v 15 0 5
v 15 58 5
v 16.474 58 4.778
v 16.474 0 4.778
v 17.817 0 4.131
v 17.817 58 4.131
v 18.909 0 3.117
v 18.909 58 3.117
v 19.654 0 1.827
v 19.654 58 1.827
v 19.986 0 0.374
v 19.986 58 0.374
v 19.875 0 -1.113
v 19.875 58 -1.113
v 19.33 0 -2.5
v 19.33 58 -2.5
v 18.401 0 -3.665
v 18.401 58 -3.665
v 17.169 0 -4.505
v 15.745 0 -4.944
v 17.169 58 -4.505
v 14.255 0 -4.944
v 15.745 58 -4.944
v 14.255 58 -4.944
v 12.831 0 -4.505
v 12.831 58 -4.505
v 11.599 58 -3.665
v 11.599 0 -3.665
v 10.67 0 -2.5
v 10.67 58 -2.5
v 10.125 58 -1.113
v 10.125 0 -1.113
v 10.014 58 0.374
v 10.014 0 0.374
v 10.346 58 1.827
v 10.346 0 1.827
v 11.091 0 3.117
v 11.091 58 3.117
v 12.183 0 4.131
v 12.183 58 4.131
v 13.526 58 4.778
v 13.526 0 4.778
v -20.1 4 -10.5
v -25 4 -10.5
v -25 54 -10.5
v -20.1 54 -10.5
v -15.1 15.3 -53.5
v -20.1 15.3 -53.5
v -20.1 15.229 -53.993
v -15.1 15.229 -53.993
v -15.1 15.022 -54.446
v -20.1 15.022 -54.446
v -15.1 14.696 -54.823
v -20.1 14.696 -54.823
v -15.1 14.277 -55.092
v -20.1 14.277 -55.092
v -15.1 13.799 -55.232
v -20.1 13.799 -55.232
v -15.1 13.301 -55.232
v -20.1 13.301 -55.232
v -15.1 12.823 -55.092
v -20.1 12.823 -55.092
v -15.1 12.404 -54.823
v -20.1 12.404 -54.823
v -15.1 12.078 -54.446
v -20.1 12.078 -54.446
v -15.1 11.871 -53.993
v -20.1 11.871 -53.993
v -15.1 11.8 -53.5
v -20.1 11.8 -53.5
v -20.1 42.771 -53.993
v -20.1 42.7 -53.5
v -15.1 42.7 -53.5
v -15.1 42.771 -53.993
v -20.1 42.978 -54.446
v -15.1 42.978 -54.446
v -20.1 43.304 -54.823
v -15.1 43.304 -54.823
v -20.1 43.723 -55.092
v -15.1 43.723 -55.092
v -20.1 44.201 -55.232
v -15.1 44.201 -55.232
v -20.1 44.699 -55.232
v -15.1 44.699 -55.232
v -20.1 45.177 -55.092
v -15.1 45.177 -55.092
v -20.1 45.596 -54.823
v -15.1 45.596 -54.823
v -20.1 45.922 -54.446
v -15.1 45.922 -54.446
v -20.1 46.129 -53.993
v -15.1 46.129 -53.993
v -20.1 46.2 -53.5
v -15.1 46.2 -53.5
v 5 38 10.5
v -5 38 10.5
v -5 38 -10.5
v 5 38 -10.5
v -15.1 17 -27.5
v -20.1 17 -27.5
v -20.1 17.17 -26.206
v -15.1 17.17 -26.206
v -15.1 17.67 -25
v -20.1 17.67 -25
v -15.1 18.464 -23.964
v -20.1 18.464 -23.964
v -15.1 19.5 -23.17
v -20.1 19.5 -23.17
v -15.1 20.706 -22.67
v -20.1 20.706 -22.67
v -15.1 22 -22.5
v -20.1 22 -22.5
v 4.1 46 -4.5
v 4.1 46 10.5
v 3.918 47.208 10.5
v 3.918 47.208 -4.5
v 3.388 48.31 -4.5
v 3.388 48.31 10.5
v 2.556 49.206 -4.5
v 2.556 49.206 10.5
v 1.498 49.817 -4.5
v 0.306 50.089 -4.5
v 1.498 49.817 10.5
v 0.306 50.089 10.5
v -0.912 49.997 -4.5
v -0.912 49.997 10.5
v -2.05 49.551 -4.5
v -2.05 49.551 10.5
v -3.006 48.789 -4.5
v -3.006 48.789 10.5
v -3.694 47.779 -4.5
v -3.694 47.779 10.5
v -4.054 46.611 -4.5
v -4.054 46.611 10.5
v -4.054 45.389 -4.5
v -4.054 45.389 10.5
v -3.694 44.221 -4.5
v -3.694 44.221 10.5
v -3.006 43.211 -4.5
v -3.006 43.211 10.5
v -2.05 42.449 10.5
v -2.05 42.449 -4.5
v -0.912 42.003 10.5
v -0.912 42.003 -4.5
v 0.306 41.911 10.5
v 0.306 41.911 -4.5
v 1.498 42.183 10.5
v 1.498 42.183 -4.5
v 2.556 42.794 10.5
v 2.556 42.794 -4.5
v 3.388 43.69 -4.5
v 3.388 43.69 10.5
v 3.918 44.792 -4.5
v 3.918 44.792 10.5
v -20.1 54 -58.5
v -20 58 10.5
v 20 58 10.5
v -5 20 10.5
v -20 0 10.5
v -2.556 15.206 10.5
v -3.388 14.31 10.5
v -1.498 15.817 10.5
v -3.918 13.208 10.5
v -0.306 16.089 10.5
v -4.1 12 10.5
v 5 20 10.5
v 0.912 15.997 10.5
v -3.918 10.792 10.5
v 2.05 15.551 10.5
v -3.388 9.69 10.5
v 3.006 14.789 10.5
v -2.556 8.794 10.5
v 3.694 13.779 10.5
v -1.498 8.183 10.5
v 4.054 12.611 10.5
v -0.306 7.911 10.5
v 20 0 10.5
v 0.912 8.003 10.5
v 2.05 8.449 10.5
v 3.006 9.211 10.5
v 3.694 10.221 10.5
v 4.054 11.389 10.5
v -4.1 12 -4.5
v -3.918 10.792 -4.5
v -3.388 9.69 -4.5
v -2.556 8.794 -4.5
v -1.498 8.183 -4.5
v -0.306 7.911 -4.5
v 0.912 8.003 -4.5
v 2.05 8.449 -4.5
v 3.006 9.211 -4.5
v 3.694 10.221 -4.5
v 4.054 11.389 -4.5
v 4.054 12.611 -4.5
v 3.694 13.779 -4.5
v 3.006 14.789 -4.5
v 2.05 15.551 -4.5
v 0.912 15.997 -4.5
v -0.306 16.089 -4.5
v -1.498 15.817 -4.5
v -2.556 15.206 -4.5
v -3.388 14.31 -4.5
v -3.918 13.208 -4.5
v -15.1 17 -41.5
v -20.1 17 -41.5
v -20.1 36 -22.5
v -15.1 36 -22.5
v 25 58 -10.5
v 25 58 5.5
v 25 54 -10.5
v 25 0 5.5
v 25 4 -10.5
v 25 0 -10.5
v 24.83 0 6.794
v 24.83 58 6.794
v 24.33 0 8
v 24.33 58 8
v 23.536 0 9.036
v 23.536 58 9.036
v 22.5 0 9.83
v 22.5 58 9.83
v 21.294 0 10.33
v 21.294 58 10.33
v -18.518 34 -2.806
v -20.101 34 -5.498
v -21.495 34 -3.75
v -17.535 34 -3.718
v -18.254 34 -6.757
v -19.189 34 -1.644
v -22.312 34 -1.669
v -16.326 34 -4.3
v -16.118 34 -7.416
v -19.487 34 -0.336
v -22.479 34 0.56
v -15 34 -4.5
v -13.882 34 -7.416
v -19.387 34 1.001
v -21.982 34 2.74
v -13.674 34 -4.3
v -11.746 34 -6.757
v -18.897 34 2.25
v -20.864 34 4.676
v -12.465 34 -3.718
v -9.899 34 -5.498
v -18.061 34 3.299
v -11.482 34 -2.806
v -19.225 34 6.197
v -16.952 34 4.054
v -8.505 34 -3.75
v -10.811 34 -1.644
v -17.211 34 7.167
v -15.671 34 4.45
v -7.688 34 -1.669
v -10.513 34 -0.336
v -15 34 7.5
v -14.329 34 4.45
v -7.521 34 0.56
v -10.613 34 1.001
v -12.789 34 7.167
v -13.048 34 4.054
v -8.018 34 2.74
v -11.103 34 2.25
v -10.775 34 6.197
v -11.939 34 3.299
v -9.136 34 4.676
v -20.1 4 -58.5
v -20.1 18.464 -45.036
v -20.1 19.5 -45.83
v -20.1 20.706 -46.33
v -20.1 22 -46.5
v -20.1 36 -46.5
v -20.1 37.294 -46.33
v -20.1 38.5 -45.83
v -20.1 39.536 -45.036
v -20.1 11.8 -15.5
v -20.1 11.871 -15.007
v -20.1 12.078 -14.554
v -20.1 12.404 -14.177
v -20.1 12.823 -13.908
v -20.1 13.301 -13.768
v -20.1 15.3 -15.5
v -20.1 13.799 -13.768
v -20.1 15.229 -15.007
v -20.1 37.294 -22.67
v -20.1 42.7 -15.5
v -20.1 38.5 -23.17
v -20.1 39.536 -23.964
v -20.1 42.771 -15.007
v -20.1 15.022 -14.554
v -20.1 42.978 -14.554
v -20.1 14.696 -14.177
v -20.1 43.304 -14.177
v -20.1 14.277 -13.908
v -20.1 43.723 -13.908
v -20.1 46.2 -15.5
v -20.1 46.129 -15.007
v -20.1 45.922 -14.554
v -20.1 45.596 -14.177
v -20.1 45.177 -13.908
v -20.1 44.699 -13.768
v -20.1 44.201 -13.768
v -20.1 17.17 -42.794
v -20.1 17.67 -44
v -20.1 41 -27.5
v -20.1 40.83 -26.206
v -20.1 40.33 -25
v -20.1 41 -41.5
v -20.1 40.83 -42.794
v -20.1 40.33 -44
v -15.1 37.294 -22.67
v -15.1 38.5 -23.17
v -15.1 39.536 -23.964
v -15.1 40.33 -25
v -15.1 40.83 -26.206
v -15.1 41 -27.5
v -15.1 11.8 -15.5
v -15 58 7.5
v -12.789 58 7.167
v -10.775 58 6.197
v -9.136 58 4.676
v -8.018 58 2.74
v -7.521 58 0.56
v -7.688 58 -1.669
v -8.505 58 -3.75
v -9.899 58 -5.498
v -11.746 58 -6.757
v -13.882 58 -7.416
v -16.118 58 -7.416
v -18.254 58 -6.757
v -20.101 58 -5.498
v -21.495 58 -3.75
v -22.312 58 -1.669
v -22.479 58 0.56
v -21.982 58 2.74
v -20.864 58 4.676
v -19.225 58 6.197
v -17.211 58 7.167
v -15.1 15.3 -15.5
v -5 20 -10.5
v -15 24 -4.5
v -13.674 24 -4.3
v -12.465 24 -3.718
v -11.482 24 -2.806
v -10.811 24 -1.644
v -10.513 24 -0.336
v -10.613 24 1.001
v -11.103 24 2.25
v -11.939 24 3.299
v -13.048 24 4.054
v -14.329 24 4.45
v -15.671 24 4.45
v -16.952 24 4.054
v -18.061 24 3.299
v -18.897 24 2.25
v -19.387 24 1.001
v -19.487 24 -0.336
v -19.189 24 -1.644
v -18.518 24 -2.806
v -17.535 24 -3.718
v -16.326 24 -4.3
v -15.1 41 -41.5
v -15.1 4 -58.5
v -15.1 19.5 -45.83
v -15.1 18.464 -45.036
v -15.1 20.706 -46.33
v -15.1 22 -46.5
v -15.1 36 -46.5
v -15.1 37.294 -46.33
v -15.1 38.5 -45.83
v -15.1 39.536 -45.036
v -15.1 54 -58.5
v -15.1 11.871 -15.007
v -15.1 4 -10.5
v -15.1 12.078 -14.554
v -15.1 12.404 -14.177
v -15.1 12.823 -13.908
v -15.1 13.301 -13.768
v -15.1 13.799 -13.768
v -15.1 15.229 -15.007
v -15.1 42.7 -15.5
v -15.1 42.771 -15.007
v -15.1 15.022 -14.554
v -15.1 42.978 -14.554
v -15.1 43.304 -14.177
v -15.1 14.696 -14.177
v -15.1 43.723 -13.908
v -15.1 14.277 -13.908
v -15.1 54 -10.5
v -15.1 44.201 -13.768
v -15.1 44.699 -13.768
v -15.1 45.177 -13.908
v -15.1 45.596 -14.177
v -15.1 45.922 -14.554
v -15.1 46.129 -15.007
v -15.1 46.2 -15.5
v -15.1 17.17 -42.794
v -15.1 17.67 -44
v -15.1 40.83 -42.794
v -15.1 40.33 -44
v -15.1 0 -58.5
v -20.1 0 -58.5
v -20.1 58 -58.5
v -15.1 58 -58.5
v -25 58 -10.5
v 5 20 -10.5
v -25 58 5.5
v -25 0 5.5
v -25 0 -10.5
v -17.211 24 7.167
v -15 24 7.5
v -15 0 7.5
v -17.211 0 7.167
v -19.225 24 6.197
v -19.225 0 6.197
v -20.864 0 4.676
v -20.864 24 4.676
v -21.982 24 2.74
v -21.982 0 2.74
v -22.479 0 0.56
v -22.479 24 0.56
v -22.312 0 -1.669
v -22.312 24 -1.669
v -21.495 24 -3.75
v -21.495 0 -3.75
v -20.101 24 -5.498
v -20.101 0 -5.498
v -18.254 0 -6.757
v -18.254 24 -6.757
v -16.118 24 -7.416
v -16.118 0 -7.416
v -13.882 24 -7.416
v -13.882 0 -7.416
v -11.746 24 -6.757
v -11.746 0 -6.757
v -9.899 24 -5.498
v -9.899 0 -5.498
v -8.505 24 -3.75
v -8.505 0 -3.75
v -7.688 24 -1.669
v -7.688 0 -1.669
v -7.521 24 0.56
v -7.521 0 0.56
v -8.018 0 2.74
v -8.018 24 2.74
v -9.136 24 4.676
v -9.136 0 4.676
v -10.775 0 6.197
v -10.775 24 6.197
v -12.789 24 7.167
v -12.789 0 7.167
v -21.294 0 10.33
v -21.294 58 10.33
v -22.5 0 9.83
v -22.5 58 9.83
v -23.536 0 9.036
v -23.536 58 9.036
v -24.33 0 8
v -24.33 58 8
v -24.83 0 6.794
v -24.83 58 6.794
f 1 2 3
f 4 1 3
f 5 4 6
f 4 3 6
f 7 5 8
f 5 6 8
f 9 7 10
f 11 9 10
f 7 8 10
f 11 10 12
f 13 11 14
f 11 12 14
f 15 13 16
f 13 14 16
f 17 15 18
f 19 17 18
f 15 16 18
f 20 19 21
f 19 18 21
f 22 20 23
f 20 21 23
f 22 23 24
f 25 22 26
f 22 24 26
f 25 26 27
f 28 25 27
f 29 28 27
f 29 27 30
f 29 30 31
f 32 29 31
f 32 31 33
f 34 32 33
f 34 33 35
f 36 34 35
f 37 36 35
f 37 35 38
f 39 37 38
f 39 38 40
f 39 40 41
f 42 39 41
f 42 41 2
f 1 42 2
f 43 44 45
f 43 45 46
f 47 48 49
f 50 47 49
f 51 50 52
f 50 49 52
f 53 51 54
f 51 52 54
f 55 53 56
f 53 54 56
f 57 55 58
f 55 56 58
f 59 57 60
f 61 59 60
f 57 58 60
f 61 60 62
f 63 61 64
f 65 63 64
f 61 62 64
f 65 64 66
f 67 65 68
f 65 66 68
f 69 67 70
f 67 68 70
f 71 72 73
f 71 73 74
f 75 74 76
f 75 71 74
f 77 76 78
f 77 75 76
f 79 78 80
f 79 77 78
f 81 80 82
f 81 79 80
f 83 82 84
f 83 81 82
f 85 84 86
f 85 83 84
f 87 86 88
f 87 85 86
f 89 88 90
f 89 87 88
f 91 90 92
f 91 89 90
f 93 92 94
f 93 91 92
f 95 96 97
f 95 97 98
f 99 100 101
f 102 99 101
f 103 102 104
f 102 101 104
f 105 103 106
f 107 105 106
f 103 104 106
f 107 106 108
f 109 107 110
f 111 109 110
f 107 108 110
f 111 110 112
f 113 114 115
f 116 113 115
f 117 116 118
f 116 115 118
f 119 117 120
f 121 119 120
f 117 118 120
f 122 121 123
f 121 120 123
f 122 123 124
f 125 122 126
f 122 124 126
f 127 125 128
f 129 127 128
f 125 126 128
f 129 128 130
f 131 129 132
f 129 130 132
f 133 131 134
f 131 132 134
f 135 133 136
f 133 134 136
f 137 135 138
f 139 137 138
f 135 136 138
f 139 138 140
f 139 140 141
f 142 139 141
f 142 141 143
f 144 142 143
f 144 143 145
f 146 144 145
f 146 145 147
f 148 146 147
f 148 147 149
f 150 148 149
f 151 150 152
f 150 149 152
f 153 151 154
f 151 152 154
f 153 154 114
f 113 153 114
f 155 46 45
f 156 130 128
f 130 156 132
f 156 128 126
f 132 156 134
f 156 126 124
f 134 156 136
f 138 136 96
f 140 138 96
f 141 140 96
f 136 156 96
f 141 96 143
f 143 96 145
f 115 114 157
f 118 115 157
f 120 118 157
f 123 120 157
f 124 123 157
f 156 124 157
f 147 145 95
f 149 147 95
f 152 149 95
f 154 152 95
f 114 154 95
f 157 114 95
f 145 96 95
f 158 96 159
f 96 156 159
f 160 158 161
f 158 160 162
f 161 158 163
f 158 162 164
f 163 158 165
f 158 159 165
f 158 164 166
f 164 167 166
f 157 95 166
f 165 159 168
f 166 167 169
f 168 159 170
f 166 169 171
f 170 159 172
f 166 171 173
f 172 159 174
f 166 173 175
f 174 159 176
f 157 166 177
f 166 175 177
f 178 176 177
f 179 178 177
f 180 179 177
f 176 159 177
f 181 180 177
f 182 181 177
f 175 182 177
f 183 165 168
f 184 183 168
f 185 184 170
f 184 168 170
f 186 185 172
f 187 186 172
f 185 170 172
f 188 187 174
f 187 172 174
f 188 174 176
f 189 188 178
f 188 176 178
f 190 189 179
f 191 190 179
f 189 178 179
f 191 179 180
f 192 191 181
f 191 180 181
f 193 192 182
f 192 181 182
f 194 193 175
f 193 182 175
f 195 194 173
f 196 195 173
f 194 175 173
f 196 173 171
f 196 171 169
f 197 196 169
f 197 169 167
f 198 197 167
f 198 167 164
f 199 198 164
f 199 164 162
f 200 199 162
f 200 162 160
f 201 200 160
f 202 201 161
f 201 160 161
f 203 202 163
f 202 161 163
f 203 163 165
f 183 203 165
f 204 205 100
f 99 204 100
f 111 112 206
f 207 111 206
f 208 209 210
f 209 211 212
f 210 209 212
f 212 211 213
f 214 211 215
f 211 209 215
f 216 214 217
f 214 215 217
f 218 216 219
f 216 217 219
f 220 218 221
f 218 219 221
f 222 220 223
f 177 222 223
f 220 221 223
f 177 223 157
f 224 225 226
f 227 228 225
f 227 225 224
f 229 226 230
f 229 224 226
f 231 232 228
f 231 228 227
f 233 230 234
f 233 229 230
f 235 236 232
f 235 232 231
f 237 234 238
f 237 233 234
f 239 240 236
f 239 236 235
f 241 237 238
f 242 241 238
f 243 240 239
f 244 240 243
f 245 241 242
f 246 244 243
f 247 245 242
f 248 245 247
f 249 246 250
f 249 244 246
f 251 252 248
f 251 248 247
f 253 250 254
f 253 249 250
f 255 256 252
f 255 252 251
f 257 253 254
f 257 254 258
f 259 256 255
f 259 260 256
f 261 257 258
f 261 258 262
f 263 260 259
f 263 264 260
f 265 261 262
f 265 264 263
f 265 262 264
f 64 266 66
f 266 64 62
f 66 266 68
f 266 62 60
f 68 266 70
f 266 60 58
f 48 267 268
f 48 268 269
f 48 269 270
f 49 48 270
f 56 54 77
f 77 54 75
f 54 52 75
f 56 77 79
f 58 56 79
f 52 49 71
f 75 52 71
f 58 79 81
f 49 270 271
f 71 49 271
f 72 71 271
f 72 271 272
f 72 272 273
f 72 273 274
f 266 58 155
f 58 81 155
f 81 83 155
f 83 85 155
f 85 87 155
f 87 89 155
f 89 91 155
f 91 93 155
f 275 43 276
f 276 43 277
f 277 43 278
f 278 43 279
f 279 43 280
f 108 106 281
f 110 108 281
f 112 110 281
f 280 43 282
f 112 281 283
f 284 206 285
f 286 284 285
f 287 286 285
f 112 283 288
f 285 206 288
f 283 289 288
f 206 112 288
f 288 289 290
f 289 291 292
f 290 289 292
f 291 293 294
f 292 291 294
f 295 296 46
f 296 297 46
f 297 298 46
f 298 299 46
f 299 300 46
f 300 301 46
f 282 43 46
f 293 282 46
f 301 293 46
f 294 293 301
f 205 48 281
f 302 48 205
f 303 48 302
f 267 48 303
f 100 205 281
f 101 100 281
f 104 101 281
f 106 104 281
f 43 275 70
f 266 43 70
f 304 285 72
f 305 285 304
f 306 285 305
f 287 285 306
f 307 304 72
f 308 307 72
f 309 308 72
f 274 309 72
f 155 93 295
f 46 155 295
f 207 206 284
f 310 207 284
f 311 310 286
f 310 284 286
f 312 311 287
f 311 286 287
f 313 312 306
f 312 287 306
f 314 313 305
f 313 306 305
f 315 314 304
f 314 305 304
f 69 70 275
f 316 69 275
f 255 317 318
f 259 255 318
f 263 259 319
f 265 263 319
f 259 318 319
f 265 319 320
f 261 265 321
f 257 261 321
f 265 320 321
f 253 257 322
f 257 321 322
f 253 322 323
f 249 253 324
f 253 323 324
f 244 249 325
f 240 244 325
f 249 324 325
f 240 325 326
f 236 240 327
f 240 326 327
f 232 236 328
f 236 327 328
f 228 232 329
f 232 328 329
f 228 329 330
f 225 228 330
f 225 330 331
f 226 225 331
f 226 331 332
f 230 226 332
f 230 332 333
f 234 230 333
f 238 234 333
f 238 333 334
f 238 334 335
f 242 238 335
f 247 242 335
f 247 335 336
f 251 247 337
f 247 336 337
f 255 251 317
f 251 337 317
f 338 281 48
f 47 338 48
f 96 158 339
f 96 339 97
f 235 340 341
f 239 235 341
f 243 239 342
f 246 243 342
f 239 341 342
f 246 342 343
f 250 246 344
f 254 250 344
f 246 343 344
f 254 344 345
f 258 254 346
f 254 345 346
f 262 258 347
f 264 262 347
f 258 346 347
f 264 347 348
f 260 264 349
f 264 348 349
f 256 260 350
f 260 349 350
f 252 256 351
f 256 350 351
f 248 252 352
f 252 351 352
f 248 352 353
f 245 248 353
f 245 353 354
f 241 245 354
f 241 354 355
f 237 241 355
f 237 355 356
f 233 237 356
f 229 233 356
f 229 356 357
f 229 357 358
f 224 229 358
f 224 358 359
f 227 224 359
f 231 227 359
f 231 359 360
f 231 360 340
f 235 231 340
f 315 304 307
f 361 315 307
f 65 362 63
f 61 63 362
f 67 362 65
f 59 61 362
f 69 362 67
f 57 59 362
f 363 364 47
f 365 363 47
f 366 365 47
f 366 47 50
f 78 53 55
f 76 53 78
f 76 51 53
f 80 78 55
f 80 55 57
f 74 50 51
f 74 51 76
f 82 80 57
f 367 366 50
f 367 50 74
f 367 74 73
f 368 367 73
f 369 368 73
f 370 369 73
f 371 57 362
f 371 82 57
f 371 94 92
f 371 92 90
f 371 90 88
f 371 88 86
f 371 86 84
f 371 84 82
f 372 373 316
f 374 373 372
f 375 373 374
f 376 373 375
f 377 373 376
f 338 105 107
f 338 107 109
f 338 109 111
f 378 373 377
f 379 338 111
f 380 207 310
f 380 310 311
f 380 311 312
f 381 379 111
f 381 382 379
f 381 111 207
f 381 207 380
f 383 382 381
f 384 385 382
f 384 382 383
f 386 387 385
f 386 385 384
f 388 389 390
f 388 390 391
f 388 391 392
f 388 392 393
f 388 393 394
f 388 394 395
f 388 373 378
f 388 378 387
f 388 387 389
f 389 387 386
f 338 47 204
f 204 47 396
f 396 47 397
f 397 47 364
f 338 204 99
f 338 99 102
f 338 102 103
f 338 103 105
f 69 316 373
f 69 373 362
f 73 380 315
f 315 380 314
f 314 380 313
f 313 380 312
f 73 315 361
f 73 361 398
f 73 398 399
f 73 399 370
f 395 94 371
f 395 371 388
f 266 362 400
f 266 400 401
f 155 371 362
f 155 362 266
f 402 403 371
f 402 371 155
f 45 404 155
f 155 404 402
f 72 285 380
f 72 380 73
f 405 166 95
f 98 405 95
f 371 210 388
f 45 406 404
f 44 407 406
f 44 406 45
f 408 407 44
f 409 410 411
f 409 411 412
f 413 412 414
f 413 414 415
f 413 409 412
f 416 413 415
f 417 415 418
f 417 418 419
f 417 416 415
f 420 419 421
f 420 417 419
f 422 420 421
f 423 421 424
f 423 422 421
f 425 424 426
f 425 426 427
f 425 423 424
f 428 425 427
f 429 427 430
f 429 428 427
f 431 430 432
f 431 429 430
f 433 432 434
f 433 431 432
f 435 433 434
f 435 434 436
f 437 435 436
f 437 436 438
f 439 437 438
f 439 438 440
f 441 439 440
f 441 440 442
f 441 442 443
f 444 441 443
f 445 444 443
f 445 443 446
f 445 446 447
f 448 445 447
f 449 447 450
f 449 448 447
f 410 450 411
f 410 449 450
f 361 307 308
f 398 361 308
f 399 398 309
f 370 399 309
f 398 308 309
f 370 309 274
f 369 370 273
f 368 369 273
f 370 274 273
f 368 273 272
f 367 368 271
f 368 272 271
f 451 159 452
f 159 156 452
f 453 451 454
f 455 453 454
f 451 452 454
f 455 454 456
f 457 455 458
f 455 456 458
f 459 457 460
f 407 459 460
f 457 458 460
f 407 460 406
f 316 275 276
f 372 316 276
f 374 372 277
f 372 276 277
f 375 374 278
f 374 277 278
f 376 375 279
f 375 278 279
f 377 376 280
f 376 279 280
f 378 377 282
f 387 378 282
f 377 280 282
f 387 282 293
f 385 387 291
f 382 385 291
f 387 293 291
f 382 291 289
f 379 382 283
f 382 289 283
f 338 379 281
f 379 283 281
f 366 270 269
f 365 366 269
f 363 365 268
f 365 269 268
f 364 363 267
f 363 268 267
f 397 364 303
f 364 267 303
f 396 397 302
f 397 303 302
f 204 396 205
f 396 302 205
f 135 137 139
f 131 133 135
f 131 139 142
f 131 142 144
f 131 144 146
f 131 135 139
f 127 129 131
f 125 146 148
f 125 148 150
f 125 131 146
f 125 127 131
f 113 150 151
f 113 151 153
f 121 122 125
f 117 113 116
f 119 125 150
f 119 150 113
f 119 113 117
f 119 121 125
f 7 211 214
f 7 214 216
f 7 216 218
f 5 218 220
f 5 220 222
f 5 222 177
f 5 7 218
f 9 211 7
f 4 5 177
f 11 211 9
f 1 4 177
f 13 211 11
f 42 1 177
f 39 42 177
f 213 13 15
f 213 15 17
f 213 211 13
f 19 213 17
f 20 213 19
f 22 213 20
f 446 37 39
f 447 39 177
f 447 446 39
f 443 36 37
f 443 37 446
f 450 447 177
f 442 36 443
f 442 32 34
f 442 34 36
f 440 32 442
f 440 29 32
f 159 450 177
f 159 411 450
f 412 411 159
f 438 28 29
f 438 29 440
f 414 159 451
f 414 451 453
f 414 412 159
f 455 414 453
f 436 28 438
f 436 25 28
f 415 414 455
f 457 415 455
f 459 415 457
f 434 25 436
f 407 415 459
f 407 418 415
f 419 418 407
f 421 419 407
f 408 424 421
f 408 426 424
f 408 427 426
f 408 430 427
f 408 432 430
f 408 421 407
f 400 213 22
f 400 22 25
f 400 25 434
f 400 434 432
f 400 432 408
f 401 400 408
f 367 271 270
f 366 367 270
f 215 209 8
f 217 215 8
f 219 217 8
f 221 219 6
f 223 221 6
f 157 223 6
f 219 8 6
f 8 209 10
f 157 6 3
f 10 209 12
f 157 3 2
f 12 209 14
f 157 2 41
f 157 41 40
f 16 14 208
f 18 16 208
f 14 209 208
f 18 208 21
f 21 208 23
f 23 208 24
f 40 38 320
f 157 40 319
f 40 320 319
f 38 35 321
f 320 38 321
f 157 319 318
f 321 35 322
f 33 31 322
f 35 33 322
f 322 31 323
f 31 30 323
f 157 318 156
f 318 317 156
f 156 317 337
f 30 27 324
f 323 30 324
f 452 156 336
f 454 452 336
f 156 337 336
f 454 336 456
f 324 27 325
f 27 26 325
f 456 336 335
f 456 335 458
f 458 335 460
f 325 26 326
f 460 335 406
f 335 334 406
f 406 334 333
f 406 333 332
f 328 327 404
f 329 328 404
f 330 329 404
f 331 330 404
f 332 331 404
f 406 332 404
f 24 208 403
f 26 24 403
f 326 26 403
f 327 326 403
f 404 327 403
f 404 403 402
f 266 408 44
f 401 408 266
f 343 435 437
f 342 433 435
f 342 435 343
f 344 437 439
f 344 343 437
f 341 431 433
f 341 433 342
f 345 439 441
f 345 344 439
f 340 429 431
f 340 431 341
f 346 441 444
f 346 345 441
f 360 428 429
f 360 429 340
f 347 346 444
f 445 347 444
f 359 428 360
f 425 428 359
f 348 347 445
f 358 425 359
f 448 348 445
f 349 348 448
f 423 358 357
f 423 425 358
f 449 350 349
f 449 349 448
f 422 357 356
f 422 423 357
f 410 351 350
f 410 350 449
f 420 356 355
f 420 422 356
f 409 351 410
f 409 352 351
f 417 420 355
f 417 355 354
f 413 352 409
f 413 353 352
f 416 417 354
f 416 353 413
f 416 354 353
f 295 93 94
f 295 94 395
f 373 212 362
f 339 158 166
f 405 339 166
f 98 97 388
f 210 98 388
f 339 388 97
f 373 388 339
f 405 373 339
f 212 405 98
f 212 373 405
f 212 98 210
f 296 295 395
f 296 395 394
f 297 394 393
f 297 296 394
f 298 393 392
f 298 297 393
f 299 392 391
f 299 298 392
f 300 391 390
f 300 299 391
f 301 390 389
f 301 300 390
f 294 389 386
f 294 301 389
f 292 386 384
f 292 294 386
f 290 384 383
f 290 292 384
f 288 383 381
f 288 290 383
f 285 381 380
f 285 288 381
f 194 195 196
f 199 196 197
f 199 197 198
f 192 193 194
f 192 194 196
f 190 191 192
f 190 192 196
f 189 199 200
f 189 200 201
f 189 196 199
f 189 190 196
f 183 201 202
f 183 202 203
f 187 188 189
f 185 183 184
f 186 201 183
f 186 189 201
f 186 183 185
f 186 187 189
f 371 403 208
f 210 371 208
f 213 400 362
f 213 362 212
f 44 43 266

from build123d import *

# Parameters (mm, degrees)
SKETCH1_W           = 50
SKETCH1_H           = 21
BOSS_EXTRUDE1_DEPTH = 58
SKETCH3_R           = 7.5
CUT_EXTRUDE1_DEPTH  = 24
CUT_EXTRUDE2_REACH  = 66.025
SKETCH4_R           = 5
CUT_EXTRUDE3_START  = -24
SKETCH5_R           = 7.5
CUT_EXTRUDE3_DEPTH  = 24
CUT_EXTRUDE4_REACH  = 66.025
SKETCH6_R           = 4.5
CUT_EXTRUDE5_REACH  = 68.558
SKETCH8_W           = 10
SKETCH8_H           = 18
SKETCH9_W           = 5
SKETCH9_H           = 58
BOSS_EXTRUDE3_DEPTH = 48
CUT_EXTRUDE7_REACH  = 95.916
BOSS_EXTRUDE4_DEPTH = 4
FILLET1_R           = 5
SKETCH7_R           = 4.1
CUT_EXTRUDE8_DEPTH  = 15


with BuildPart() as part:
    # Sketch1 → Boss-Extrude1 (new body)
    with BuildSketch(Plane(origin=(0, 0, 0), x_dir=(1, 0, 0), z_dir=(0, 1, 0))):
        Rectangle(SKETCH1_W, SKETCH1_H)
    extrude(amount=BOSS_EXTRUDE1_DEPTH)

    # Sketch3 → Cut-Extrude1 (cut)
    with BuildSketch(Plane(origin=(0, 58, 0), x_dir=(1, 0, 0), z_dir=(0, 1, 0))):
        with Locations(Location((-15, 0, 0), (0, 0, 270))):
            Circle(SKETCH3_R)
    extrude(amount=-CUT_EXTRUDE1_DEPTH, mode=Mode.SUBTRACT)

    # Sketch4 → Cut-Extrude2 (cut, up to next)
    with BuildSketch(Plane(origin=(0, 58, 0), x_dir=(1, 0, 0), z_dir=(0, 1, 0)), mode=Mode.PRIVATE) as cut_extrude2_sk1:
        with Locations(Location((15, 0, 0), (0, 0, 270))):
            Circle(SKETCH4_R)
    cut_extrude2_tool1 = extrude(cut_extrude2_sk1.sketch, amount=-CUT_EXTRUDE2_REACH, mode=Mode.PRIVATE) & part.part
    add(cut_extrude2_tool1.solids().sort_by_distance((15, 58, 0))[0], mode=Mode.SUBTRACT)

    # Sketch5 → Cut-Extrude3 (cut)
    with BuildSketch(Plane.XZ.offset(CUT_EXTRUDE3_START)):
        with Locations(Location((-15, 0, 0), (0, 0, 90))):
            Circle(SKETCH5_R)
    extrude(amount=CUT_EXTRUDE3_DEPTH, mode=Mode.SUBTRACT)

    # Sketch6 → Cut-Extrude4 (cut, up to next)
    with BuildSketch(Plane.XZ, mode=Mode.PRIVATE) as cut_extrude4_sk1:
        with Locations(Location((-15, 0, 0), (0, 0, 270))):
            Circle(SKETCH6_R)
    cut_extrude4_tool1 = extrude(cut_extrude4_sk1.sketch, amount=-CUT_EXTRUDE4_REACH, mode=Mode.PRIVATE) & part.part
    add(cut_extrude4_tool1.solids().sort_by_distance((-15, 0, 0))[0], mode=Mode.SUBTRACT)

    # Sketch8 → Cut-Extrude5 (cut, up to next)
    with BuildSketch(Plane.XY.offset(10.5), mode=Mode.PRIVATE) as cut_extrude5_sk1:
        with Locations((0, 29)):
            Rectangle(SKETCH8_W, SKETCH8_H)
    cut_extrude5_tool1 = extrude(cut_extrude5_sk1.sketch, amount=-CUT_EXTRUDE5_REACH, mode=Mode.PRIVATE) & part.part
    add(cut_extrude5_tool1.solids().sort_by_distance((0, 29, 10.5))[0], mode=Mode.SUBTRACT)

    # Sketch9 → Boss-Extrude3 (add)
    with BuildSketch(Plane(origin=(0, 0, -10.5), x_dir=(-1, 0, 0), z_dir=(0, 0, -1))):
        with Locations((17.6, 29)):
            Rectangle(SKETCH9_W, SKETCH9_H)
    extrude(amount=BOSS_EXTRUDE3_DEPTH)

    # Sketch10 → Cut-Extrude7 (cut, up to next)
    with BuildSketch(Plane.ZY.offset(20.1), mode=Mode.PRIVATE) as cut_extrude7_sk1:
        with BuildLine():
            Line((-41.5, 17), (-27.5, 17))
            ThreePointArc((-27.5, 17), (-23.964466094, 18.464466094), (-22.5, 22))
            Line((-22.5, 22), (-22.5, 36))
            ThreePointArc((-22.5, 36), (-23.964466094, 39.535533906), (-27.5, 41))
            Line((-27.5, 41), (-41.5, 41))
            ThreePointArc((-41.5, 41), (-45.035533906, 39.535533906), (-46.5, 36))
            Line((-46.5, 36), (-46.5, 22))
            ThreePointArc((-46.5, 22), (-45.035533906, 18.464466094), (-41.5, 17))
        make_face()
    cut_extrude7_tool1 = extrude(cut_extrude7_sk1.sketch, amount=-CUT_EXTRUDE7_REACH, mode=Mode.PRIVATE) & part.part
    # Sketch10 → Cut-Extrude7 (cut, up to next)
    with BuildSketch(Plane.ZY.offset(20.1), mode=Mode.PRIVATE) as cut_extrude7_sk2:
        with BuildLine():
            Line((-15.5, 42.7), (-53.5, 42.7))
            ThreePointArc((-53.5, 42.7), (-55.25, 44.45), (-53.5, 46.2))
            Line((-53.5, 46.2), (-15.5, 46.2))
            ThreePointArc((-15.5, 46.2), (-13.75, 44.45), (-15.5, 42.7))
        make_face()
    cut_extrude7_tool2 = extrude(cut_extrude7_sk2.sketch, amount=-CUT_EXTRUDE7_REACH, mode=Mode.PRIVATE) & part.part
    # Sketch10 → Cut-Extrude7 (cut, up to next)
    with BuildSketch(Plane.ZY.offset(20.1), mode=Mode.PRIVATE) as cut_extrude7_sk3:
        with BuildLine():
            Line((-15.5, 15.3), (-53.5, 15.3))
            ThreePointArc((-53.5, 15.3), (-55.25, 13.55), (-53.5, 11.8))
            Line((-53.5, 11.8), (-15.5, 11.8))
            ThreePointArc((-15.5, 11.8), (-13.75, 13.55), (-15.5, 15.3))
        make_face()
    cut_extrude7_tool3 = extrude(cut_extrude7_sk3.sketch, amount=-CUT_EXTRUDE7_REACH, mode=Mode.PRIVATE) & part.part
    add(cut_extrude7_tool1.solids().sort_by_distance((-20.1, 29, -34.5))[0], mode=Mode.SUBTRACT)
    add(cut_extrude7_tool2.solids().sort_by_distance((-20.1, 44.45, -34.5))[0], mode=Mode.SUBTRACT)
    add(cut_extrude7_tool3.solids().sort_by_distance((-20.1, 13.55, -34.5))[0], mode=Mode.SUBTRACT)

    # Sketch11 → Boss-Extrude4 (add)
    with BuildSketch(Plane(origin=(0, 0, 0), x_dir=(-1, 0, 0), z_dir=(0, -1, 0))):
        Polygon((15.1, 58.5), (-25, 10.5), (15.1, 10.5), align=None)
        Polygon((20.1, 58.5), (20.1, 10.5), (25, 10.5), align=None)
    boss_extrude4 = extrude(amount=-BOSS_EXTRUDE4_DEPTH)

    # Mirror1: Boss-Extrude4 across plane
    add(boss_extrude4.mirror(Plane(origin=(0, 29, 0), x_dir=(0, 0, 1), z_dir=(0, -1, 0))))

    # Fillet1
    fillet1_edges = [part.edges().sort_by_distance(p)[0] for p in [
        (25, 29, 10.5),
        (-25, 29, 10.5),
    ]]
    fillet(fillet1_edges, radius=FILLET1_R)

    # Sketch7 → Cut-Extrude8 (cut)
    with BuildSketch(Plane.XY.offset(10.5)):
        with Locations((0, 46)):
            Circle(SKETCH7_R)
        with Locations(Location((0, 12, 0), (0, 0, 180))):
            Circle(SKETCH7_R)
    extrude(amount=-CUT_EXTRUDE8_DEPTH, mode=Mode.SUBTRACT)


solid = part.part
